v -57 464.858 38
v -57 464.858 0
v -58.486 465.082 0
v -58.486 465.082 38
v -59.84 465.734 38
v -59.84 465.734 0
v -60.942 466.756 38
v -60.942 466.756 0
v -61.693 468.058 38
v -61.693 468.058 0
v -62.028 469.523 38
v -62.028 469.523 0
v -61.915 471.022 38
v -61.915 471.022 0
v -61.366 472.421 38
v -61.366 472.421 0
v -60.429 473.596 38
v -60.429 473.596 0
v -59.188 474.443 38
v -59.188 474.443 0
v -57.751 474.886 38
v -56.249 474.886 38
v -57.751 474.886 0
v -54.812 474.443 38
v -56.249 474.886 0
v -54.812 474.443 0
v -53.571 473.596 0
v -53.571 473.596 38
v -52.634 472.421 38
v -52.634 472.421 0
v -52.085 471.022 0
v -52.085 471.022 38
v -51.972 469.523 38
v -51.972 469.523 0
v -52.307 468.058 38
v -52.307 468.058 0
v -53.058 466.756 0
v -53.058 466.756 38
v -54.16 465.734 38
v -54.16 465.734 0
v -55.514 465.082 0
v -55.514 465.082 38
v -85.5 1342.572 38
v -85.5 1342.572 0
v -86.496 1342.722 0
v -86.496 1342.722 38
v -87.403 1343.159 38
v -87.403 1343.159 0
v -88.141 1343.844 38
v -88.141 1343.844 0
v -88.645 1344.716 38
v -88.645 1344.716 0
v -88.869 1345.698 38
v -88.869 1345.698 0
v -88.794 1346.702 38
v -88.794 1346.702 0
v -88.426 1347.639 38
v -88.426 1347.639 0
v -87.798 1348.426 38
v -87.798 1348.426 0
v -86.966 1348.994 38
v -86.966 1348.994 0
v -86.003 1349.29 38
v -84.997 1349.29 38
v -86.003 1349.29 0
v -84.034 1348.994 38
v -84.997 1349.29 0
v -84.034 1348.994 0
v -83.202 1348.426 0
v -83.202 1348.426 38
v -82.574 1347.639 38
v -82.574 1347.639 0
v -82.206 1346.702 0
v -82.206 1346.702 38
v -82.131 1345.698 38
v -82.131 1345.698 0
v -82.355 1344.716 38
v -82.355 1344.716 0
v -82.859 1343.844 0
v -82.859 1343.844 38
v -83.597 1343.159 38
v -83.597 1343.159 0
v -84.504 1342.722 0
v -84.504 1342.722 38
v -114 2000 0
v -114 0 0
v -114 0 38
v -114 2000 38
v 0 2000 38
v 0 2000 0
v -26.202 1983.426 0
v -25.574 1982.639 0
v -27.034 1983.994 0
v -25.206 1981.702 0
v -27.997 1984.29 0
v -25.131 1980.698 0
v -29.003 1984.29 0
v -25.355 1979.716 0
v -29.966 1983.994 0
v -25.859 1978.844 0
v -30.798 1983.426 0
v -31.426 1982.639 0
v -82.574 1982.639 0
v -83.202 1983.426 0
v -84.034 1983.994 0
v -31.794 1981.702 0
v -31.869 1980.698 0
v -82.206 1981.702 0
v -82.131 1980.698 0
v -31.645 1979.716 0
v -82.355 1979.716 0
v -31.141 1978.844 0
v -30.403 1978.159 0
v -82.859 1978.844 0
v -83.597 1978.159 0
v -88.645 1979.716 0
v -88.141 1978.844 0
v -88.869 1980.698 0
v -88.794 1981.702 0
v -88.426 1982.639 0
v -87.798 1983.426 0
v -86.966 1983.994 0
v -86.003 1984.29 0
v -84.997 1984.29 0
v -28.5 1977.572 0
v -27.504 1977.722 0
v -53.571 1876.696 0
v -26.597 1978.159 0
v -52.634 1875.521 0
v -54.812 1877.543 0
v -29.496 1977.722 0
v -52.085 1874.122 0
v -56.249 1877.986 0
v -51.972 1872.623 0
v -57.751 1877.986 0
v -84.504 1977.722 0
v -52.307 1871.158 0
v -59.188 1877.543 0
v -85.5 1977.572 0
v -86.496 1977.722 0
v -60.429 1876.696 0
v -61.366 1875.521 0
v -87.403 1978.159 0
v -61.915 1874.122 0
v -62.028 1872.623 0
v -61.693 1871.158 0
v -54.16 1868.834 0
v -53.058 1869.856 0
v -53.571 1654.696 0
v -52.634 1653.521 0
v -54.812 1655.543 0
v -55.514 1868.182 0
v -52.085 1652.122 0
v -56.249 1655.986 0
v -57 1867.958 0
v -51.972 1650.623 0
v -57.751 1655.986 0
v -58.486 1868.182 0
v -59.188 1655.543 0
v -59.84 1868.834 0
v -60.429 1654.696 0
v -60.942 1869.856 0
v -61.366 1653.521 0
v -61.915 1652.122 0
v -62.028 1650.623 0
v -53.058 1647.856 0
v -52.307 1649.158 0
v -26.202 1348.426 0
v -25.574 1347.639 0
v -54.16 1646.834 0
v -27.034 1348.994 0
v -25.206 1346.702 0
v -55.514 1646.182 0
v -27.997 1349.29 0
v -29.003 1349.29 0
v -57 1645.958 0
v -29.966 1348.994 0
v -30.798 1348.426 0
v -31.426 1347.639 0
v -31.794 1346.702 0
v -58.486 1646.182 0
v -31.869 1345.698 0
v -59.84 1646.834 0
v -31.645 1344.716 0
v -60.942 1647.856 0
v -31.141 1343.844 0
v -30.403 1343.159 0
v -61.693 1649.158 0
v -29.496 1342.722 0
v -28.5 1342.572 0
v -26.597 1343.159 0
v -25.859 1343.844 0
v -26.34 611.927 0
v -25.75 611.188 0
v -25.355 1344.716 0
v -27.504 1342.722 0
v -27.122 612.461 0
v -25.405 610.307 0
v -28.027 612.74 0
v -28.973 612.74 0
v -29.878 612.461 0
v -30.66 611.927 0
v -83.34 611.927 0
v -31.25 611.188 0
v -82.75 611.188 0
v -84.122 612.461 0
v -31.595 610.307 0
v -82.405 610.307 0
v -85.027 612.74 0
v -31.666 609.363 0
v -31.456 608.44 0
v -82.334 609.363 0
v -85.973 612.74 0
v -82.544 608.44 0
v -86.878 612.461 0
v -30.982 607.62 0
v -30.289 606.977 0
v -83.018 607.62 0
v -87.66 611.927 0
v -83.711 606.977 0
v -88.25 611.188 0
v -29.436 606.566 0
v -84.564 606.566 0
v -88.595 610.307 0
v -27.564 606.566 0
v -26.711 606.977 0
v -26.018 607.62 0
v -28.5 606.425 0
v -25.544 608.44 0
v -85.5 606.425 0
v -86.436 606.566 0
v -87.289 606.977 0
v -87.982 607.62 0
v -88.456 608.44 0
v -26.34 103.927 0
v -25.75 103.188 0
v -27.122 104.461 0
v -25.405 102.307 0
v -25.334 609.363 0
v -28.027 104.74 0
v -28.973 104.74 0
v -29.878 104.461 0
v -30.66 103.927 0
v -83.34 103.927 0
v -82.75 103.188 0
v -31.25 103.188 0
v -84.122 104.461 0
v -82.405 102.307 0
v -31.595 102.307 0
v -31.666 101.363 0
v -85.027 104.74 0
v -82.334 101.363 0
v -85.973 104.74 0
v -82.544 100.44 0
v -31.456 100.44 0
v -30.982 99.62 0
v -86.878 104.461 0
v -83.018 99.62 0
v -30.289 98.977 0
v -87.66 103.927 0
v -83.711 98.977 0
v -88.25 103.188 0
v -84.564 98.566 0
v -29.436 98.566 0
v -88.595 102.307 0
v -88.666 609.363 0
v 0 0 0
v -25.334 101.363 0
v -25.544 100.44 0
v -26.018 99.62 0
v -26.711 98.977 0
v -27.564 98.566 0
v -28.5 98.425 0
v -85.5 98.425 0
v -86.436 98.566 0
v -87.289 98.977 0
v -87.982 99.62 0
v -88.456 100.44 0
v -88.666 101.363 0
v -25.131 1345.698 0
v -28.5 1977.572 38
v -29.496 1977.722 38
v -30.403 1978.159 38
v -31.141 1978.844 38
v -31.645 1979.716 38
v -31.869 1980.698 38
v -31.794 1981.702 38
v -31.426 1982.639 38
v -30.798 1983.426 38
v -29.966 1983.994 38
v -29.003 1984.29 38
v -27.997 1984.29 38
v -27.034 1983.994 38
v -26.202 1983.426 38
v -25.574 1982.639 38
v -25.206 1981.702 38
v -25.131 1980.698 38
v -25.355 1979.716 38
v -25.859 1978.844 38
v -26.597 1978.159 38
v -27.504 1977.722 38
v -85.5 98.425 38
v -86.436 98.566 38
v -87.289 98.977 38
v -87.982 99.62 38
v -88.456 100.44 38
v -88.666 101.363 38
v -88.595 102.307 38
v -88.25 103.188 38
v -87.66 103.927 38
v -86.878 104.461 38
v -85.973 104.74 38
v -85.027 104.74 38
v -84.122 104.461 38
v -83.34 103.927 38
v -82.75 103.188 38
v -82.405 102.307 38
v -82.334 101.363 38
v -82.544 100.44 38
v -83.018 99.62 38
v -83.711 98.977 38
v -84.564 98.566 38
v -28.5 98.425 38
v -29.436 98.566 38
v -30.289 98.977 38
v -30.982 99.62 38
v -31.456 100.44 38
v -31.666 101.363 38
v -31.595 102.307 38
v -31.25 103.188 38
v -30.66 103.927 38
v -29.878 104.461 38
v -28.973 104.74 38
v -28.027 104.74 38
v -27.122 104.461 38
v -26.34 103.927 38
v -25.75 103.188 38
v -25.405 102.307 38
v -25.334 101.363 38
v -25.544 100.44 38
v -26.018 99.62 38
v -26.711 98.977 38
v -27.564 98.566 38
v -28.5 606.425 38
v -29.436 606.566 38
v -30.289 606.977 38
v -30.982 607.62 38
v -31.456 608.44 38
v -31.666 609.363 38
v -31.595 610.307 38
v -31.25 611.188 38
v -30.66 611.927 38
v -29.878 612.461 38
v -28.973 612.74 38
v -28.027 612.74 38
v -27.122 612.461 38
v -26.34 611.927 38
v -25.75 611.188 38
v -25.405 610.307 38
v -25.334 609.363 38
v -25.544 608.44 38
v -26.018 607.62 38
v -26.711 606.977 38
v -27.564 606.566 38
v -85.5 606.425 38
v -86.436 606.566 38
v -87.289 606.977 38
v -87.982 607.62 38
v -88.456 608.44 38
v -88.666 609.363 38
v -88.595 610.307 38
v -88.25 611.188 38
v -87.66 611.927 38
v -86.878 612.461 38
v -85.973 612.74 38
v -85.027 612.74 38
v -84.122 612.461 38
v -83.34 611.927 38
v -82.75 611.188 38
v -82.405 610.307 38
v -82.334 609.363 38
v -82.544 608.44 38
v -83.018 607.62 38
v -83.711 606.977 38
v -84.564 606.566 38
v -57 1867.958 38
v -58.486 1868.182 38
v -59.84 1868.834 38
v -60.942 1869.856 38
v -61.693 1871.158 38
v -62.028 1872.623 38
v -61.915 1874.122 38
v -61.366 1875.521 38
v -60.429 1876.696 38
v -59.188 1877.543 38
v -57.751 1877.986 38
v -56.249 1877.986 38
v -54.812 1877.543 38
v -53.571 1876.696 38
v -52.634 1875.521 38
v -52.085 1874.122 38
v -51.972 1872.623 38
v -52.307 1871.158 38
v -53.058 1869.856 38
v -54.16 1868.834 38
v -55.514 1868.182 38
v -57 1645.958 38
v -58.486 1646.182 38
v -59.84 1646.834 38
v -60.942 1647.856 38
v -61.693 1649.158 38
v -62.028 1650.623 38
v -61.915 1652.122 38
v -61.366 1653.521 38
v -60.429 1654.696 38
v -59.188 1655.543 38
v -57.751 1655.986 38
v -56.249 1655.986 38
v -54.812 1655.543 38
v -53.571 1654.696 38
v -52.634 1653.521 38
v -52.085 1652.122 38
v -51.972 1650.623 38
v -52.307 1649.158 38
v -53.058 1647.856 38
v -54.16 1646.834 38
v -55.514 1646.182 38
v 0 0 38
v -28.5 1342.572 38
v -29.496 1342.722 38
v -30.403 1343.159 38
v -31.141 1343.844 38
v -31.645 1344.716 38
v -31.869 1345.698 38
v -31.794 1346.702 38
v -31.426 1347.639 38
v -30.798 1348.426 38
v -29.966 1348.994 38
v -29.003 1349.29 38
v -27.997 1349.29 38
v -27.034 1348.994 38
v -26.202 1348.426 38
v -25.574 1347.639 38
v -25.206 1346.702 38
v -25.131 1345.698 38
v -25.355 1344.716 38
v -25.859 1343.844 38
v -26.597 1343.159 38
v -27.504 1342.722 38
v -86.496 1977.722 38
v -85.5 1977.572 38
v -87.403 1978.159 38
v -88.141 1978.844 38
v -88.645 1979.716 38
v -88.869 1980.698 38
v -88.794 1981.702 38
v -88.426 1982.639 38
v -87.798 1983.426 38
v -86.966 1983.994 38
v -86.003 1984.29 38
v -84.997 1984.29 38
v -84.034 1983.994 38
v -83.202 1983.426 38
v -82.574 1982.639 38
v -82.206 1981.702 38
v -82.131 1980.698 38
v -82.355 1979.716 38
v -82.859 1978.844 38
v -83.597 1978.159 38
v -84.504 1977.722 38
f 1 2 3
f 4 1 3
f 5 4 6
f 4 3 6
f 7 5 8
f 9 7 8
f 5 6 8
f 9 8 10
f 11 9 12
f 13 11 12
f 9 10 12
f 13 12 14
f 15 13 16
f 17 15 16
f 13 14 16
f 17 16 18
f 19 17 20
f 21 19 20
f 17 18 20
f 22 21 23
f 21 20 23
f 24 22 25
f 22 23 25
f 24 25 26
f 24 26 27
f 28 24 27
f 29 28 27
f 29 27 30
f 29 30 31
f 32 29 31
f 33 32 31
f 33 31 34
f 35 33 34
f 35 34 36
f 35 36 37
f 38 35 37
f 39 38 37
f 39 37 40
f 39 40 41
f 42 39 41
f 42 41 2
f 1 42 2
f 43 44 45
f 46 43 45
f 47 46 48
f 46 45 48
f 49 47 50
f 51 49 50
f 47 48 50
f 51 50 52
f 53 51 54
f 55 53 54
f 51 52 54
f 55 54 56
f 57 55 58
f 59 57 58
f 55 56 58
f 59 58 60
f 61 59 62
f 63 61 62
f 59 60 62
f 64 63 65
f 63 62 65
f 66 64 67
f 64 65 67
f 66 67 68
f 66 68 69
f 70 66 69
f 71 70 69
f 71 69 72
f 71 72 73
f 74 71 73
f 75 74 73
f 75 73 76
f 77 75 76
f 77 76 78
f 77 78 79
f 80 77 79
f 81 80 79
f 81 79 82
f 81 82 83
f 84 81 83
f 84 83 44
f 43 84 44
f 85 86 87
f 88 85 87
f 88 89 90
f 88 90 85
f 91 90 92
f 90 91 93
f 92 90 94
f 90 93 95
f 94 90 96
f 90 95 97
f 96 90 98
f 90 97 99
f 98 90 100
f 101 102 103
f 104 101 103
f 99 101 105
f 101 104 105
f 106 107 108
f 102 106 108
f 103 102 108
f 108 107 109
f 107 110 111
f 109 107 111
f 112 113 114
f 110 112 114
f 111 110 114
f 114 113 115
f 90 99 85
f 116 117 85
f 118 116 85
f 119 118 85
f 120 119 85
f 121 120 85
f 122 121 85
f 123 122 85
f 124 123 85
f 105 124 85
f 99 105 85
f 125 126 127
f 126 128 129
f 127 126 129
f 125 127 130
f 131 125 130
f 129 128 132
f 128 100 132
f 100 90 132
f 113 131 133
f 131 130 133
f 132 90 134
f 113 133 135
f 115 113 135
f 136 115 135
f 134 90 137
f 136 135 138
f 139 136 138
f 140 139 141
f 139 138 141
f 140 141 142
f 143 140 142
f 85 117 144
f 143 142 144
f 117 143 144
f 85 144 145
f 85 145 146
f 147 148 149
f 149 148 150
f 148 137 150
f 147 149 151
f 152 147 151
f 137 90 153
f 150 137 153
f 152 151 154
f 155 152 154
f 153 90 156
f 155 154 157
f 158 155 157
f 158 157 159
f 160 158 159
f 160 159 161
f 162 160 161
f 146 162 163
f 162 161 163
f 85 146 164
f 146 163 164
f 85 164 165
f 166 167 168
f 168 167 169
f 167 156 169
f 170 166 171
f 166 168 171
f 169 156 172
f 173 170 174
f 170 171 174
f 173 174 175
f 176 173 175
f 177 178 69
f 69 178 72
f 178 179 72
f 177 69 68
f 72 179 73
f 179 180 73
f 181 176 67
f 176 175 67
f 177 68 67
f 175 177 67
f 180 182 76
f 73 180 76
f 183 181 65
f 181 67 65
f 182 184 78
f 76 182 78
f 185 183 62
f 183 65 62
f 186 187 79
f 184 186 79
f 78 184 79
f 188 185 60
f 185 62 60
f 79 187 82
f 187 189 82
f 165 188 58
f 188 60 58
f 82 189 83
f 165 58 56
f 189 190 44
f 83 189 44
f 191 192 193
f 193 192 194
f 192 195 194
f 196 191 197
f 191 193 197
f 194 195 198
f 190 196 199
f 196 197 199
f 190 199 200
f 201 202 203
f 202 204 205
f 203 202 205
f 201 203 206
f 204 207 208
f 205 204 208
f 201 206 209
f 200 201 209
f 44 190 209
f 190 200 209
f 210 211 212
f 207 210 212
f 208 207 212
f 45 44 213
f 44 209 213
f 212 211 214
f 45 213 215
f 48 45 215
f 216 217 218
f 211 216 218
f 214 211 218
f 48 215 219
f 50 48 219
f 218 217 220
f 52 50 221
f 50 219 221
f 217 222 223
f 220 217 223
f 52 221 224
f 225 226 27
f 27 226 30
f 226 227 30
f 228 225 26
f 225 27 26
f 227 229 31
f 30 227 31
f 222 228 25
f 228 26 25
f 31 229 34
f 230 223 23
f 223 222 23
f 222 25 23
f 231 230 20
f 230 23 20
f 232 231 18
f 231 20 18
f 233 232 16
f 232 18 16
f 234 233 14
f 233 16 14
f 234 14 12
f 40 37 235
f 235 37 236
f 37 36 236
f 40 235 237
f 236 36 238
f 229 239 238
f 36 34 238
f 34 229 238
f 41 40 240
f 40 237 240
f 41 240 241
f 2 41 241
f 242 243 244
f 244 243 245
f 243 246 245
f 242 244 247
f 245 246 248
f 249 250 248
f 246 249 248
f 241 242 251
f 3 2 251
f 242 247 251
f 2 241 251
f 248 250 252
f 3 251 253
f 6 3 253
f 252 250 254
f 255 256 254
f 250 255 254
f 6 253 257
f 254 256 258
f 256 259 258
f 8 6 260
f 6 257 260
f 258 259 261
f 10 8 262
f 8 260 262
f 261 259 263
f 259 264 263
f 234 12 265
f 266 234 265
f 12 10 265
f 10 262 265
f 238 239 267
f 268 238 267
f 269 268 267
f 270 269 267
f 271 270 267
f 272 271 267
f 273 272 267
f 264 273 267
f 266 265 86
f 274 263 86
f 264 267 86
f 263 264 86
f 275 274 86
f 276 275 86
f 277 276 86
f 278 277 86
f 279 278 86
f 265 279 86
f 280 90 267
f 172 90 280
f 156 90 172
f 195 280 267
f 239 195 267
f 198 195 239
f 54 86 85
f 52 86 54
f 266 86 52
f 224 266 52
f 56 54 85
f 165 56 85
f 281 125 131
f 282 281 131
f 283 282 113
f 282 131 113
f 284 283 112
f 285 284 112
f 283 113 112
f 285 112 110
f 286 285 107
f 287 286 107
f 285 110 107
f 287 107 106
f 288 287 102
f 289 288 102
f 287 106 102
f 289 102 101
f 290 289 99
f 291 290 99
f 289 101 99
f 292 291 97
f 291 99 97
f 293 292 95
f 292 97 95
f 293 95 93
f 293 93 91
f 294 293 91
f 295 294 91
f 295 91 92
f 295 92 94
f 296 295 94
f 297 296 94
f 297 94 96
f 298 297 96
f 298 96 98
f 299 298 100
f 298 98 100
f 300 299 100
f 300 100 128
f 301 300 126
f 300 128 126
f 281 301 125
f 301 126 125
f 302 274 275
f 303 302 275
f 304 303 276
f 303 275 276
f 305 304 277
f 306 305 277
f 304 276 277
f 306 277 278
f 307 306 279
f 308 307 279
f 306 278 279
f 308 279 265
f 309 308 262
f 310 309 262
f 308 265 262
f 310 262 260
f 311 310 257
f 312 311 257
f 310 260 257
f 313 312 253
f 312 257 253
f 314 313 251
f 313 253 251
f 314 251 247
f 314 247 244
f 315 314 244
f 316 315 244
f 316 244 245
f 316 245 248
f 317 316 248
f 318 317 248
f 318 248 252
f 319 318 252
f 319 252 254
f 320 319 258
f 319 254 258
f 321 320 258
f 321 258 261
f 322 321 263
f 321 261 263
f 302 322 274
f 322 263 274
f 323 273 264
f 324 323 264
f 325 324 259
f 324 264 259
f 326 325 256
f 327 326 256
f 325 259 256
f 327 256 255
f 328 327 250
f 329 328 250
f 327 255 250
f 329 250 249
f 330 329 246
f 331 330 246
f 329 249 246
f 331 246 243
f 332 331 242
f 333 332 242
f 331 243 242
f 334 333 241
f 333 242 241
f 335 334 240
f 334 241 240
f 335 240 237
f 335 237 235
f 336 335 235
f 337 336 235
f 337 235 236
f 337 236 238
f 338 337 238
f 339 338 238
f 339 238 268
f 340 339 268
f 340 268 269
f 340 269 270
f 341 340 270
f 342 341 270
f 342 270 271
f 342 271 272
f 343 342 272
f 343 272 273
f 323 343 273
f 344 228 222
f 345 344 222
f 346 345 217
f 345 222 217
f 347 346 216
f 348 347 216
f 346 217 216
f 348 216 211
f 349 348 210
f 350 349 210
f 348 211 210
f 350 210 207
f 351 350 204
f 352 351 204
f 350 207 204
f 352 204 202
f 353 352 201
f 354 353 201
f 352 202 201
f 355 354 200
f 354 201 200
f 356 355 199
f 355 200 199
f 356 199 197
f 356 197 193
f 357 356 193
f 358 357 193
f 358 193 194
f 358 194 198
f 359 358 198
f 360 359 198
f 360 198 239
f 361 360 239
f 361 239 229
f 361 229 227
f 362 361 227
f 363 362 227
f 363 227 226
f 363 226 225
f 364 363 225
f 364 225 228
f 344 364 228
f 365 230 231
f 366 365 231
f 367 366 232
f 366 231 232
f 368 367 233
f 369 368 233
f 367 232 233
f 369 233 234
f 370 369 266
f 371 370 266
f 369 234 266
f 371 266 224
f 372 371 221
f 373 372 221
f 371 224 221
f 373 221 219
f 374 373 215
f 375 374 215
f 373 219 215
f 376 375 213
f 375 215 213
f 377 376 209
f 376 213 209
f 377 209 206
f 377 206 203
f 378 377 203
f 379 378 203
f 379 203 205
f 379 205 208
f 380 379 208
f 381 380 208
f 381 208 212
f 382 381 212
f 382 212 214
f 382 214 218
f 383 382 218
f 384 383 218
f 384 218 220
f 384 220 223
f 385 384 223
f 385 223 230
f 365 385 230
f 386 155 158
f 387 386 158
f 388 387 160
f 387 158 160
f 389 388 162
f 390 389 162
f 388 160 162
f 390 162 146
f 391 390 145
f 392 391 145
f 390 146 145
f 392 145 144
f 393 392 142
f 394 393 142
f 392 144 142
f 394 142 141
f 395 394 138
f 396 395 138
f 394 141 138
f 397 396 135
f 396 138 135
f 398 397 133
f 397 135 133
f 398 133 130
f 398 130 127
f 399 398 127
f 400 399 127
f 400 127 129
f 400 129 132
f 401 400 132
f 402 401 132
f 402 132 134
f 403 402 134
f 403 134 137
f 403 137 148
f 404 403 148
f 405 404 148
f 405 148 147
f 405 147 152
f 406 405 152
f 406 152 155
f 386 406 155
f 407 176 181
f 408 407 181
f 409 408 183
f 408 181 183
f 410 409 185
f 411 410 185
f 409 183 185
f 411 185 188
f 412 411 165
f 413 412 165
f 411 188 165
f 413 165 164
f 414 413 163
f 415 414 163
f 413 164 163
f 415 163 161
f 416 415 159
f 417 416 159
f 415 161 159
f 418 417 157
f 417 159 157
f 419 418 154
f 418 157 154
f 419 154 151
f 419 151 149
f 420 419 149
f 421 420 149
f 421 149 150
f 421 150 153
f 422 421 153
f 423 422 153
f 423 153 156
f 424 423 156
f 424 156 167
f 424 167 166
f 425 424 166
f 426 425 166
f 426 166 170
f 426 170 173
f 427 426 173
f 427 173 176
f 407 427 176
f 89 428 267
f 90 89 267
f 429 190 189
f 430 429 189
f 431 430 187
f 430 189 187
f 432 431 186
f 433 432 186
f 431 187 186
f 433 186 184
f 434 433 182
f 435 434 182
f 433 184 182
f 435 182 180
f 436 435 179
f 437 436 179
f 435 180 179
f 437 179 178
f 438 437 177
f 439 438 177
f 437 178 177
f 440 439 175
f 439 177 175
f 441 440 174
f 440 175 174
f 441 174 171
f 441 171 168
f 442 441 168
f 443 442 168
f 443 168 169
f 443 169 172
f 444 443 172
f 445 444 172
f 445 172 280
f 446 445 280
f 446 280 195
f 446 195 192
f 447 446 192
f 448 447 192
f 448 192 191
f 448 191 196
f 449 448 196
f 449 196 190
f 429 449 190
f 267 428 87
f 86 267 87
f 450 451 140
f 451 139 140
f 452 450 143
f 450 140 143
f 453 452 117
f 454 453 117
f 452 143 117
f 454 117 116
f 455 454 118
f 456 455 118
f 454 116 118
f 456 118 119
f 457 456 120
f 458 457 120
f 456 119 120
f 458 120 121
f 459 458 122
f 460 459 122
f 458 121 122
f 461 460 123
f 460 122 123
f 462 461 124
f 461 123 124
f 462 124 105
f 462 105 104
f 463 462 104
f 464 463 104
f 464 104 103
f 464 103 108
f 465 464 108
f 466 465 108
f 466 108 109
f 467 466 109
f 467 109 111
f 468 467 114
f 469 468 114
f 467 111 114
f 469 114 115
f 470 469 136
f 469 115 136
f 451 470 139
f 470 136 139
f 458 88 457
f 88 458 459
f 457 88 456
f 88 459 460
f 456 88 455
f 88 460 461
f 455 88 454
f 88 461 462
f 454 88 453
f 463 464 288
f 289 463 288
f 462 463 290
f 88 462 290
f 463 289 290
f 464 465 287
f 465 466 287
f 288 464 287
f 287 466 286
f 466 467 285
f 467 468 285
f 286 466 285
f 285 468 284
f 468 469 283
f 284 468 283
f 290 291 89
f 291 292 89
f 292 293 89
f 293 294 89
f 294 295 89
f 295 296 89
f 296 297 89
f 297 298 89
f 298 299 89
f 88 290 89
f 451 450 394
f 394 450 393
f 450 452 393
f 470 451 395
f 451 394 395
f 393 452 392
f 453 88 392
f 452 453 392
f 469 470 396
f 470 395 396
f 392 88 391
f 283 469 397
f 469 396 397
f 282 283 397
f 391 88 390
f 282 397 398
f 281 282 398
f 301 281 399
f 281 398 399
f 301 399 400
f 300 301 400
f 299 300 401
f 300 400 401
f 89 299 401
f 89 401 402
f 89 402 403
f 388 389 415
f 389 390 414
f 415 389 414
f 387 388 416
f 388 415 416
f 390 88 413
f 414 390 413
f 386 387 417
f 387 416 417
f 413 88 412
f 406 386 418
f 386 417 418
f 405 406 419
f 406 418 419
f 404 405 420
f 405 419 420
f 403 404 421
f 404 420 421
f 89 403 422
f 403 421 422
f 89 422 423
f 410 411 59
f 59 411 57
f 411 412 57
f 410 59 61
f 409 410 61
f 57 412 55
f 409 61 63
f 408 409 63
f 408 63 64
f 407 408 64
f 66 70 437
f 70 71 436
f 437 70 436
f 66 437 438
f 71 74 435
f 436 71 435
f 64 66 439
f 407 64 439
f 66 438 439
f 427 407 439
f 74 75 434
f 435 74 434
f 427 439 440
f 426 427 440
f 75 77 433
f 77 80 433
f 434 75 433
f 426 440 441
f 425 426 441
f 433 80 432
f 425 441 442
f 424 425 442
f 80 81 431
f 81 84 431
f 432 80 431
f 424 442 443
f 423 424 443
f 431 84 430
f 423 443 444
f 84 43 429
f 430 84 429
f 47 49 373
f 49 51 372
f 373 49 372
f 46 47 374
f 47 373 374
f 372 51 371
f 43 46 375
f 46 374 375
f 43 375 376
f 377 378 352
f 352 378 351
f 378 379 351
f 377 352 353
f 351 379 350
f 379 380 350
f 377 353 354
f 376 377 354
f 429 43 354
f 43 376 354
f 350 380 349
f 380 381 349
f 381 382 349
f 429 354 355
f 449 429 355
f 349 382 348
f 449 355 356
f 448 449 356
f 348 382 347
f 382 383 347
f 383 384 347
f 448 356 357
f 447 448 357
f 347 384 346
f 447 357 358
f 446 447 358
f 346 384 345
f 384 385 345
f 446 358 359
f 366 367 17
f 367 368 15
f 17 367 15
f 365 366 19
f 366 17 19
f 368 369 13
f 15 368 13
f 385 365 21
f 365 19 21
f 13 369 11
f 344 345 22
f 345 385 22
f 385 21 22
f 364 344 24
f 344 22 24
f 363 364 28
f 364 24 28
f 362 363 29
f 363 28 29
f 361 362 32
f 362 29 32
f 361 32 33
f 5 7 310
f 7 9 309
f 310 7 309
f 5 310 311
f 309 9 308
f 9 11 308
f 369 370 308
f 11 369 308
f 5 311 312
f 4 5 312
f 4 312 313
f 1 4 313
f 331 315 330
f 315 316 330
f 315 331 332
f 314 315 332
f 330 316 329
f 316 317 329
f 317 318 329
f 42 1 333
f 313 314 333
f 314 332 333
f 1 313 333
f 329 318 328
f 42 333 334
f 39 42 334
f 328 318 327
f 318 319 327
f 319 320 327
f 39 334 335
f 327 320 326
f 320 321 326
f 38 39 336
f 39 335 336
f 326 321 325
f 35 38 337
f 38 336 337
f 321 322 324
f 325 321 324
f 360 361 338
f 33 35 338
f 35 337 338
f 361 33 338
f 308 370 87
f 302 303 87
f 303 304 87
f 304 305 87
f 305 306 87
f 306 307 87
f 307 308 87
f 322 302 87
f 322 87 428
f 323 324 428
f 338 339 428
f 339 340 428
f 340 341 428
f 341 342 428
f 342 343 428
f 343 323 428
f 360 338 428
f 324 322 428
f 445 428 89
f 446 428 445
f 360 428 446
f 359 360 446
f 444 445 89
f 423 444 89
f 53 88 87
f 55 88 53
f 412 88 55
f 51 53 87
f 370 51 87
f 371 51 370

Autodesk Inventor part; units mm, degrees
ref_plane "YZ Plane" through (0, 0, 0) normal (1, 0, 0) x (0, 1, 0)
ref_plane "XZ Plane" through (0, 0, 0) normal (0, 1, 0) x (-1, 0, 0)
ref_plane "XY Plane" through (0, 0, 0) normal (0, 0, 1) x (1, 0, 0)
sketch "Sketch1" plane through (0, 0, 0) normal (0, 1, 0) x (-1, 0, 0)
  line L0 (0, 0) -> (114, 0)
  line L1 (114, 0) -> (114, 38)
  line L2 (114, 38) -> (0, 38)
  line L3 (0, 38) -> (0, 0)
  dimension "d0" = 114
  dimension "d1" = 38
extrude "Extrusion1" add sketch "Sketch1" along normal blind 2000
sketch "Sketch3" plane through (-114, 0, 38) normal (0, 0, 1) x (1, 0, 0)
  line L0 (0, 0) -> (114, 0) projected
  line L1 (0, 0) -> (0, 2000) projected
  circle A0 centre (28.5, 101.6) radius 5.7238
  circle A1 centre (85.5, 101.6) radius 5.7238
  circle A2 centre (28.5, 609.6) radius 5.7238
  circle A3 centre (85.5, 609.6) radius 5.7238
  dimension "d28" = 101.6
  dimension "d29" = 28.5
  dimension "d32" = 57
  dimension "d35" = 508
hole "rimArm" at (-85.5, 609.6, 38) at (-28.5, 609.6, 38) at (-85.5, 101.6, 38) at (-28.5, 101.6, 38) direction (0, 0, -1) diameter 6.35 end through all
sketch "Sketch4" plane through (-114, 0, 38) normal (0, 0, 1) x (1, 0, 0)
  line L0 (0, 2000) -> (114, 2000) projected
  line L1 (0, 0) -> (0, 2000) projected
  circle A0 centre (28.5, 1980.95) radius 4.8454
  circle A1 centre (85.5, 1980.95) radius 4.8454
  circle A2 centre (28.5, 1345.95) radius 4.8454
  circle A3 centre (85.5, 1345.95) radius 4.8454
  dimension "d45" = 19.05
  dimension "d48" = 57
  dimension "d51" = 635
  dimension "d71" = 28.5
hole "screenArm" at (-85.5, 1980.95, 38) at (-28.5, 1980.95, 38) at (-28.5, 1345.95, 38) at (-85.5, 1345.95, 38) direction (0, 0, -1) diameter 6.7564 end through all clearance for "Flat Head Machine Screw (82)" size "1/4" standard "Ansi Unified Screw Threads"
sketch "Sketch5" plane through (-114, 0, 38) normal (0, 0, 1) x (1, 0, 0)
  line L0 (0, 0) -> (114, 0) projected
  line L1 (0, 2000) -> (114, 2000) projected
  circle A0 centre (57, 1873) radius 8.4367
  circle A1 centre (57, 1651) radius 12.5456
  circle A2 centre (57, 469.9) radius 11.5895
  line L2 (0, 0) -> (0, 2000) projected
  dimension "d61" = 127
  dimension "d62" = 469.9
  dimension "d70" = 1651
  dimension "d72" = 57
  dimension "d73" = 57
  dimension "d74" = 57
hole "poleAttach" at (-57, 1873, 38) at (-57, 1651, 38) at (-57, 469.9, 38) direction (0, 0, -1) diameter 10.0838 end through all clearance for "Flat Head Machine Screw (82)" size "3/8" standard "Ansi Unified Screw Threads"
equation "\"d29\" = 0.25 * d0"
equation "\"d32\" = 0.5 * d0"
equation "\"d48\" = 0.5 * d0"
equation "\"d71\" = 0.25 * d0"
equation "\"d72\" = 0.5 * d0"
equation "\"d73\" = 0.5 * d0"
equation "\"d74\" = 0.5 * d0"
properties part number "2p2psv" material "Wood (Cherry)"
